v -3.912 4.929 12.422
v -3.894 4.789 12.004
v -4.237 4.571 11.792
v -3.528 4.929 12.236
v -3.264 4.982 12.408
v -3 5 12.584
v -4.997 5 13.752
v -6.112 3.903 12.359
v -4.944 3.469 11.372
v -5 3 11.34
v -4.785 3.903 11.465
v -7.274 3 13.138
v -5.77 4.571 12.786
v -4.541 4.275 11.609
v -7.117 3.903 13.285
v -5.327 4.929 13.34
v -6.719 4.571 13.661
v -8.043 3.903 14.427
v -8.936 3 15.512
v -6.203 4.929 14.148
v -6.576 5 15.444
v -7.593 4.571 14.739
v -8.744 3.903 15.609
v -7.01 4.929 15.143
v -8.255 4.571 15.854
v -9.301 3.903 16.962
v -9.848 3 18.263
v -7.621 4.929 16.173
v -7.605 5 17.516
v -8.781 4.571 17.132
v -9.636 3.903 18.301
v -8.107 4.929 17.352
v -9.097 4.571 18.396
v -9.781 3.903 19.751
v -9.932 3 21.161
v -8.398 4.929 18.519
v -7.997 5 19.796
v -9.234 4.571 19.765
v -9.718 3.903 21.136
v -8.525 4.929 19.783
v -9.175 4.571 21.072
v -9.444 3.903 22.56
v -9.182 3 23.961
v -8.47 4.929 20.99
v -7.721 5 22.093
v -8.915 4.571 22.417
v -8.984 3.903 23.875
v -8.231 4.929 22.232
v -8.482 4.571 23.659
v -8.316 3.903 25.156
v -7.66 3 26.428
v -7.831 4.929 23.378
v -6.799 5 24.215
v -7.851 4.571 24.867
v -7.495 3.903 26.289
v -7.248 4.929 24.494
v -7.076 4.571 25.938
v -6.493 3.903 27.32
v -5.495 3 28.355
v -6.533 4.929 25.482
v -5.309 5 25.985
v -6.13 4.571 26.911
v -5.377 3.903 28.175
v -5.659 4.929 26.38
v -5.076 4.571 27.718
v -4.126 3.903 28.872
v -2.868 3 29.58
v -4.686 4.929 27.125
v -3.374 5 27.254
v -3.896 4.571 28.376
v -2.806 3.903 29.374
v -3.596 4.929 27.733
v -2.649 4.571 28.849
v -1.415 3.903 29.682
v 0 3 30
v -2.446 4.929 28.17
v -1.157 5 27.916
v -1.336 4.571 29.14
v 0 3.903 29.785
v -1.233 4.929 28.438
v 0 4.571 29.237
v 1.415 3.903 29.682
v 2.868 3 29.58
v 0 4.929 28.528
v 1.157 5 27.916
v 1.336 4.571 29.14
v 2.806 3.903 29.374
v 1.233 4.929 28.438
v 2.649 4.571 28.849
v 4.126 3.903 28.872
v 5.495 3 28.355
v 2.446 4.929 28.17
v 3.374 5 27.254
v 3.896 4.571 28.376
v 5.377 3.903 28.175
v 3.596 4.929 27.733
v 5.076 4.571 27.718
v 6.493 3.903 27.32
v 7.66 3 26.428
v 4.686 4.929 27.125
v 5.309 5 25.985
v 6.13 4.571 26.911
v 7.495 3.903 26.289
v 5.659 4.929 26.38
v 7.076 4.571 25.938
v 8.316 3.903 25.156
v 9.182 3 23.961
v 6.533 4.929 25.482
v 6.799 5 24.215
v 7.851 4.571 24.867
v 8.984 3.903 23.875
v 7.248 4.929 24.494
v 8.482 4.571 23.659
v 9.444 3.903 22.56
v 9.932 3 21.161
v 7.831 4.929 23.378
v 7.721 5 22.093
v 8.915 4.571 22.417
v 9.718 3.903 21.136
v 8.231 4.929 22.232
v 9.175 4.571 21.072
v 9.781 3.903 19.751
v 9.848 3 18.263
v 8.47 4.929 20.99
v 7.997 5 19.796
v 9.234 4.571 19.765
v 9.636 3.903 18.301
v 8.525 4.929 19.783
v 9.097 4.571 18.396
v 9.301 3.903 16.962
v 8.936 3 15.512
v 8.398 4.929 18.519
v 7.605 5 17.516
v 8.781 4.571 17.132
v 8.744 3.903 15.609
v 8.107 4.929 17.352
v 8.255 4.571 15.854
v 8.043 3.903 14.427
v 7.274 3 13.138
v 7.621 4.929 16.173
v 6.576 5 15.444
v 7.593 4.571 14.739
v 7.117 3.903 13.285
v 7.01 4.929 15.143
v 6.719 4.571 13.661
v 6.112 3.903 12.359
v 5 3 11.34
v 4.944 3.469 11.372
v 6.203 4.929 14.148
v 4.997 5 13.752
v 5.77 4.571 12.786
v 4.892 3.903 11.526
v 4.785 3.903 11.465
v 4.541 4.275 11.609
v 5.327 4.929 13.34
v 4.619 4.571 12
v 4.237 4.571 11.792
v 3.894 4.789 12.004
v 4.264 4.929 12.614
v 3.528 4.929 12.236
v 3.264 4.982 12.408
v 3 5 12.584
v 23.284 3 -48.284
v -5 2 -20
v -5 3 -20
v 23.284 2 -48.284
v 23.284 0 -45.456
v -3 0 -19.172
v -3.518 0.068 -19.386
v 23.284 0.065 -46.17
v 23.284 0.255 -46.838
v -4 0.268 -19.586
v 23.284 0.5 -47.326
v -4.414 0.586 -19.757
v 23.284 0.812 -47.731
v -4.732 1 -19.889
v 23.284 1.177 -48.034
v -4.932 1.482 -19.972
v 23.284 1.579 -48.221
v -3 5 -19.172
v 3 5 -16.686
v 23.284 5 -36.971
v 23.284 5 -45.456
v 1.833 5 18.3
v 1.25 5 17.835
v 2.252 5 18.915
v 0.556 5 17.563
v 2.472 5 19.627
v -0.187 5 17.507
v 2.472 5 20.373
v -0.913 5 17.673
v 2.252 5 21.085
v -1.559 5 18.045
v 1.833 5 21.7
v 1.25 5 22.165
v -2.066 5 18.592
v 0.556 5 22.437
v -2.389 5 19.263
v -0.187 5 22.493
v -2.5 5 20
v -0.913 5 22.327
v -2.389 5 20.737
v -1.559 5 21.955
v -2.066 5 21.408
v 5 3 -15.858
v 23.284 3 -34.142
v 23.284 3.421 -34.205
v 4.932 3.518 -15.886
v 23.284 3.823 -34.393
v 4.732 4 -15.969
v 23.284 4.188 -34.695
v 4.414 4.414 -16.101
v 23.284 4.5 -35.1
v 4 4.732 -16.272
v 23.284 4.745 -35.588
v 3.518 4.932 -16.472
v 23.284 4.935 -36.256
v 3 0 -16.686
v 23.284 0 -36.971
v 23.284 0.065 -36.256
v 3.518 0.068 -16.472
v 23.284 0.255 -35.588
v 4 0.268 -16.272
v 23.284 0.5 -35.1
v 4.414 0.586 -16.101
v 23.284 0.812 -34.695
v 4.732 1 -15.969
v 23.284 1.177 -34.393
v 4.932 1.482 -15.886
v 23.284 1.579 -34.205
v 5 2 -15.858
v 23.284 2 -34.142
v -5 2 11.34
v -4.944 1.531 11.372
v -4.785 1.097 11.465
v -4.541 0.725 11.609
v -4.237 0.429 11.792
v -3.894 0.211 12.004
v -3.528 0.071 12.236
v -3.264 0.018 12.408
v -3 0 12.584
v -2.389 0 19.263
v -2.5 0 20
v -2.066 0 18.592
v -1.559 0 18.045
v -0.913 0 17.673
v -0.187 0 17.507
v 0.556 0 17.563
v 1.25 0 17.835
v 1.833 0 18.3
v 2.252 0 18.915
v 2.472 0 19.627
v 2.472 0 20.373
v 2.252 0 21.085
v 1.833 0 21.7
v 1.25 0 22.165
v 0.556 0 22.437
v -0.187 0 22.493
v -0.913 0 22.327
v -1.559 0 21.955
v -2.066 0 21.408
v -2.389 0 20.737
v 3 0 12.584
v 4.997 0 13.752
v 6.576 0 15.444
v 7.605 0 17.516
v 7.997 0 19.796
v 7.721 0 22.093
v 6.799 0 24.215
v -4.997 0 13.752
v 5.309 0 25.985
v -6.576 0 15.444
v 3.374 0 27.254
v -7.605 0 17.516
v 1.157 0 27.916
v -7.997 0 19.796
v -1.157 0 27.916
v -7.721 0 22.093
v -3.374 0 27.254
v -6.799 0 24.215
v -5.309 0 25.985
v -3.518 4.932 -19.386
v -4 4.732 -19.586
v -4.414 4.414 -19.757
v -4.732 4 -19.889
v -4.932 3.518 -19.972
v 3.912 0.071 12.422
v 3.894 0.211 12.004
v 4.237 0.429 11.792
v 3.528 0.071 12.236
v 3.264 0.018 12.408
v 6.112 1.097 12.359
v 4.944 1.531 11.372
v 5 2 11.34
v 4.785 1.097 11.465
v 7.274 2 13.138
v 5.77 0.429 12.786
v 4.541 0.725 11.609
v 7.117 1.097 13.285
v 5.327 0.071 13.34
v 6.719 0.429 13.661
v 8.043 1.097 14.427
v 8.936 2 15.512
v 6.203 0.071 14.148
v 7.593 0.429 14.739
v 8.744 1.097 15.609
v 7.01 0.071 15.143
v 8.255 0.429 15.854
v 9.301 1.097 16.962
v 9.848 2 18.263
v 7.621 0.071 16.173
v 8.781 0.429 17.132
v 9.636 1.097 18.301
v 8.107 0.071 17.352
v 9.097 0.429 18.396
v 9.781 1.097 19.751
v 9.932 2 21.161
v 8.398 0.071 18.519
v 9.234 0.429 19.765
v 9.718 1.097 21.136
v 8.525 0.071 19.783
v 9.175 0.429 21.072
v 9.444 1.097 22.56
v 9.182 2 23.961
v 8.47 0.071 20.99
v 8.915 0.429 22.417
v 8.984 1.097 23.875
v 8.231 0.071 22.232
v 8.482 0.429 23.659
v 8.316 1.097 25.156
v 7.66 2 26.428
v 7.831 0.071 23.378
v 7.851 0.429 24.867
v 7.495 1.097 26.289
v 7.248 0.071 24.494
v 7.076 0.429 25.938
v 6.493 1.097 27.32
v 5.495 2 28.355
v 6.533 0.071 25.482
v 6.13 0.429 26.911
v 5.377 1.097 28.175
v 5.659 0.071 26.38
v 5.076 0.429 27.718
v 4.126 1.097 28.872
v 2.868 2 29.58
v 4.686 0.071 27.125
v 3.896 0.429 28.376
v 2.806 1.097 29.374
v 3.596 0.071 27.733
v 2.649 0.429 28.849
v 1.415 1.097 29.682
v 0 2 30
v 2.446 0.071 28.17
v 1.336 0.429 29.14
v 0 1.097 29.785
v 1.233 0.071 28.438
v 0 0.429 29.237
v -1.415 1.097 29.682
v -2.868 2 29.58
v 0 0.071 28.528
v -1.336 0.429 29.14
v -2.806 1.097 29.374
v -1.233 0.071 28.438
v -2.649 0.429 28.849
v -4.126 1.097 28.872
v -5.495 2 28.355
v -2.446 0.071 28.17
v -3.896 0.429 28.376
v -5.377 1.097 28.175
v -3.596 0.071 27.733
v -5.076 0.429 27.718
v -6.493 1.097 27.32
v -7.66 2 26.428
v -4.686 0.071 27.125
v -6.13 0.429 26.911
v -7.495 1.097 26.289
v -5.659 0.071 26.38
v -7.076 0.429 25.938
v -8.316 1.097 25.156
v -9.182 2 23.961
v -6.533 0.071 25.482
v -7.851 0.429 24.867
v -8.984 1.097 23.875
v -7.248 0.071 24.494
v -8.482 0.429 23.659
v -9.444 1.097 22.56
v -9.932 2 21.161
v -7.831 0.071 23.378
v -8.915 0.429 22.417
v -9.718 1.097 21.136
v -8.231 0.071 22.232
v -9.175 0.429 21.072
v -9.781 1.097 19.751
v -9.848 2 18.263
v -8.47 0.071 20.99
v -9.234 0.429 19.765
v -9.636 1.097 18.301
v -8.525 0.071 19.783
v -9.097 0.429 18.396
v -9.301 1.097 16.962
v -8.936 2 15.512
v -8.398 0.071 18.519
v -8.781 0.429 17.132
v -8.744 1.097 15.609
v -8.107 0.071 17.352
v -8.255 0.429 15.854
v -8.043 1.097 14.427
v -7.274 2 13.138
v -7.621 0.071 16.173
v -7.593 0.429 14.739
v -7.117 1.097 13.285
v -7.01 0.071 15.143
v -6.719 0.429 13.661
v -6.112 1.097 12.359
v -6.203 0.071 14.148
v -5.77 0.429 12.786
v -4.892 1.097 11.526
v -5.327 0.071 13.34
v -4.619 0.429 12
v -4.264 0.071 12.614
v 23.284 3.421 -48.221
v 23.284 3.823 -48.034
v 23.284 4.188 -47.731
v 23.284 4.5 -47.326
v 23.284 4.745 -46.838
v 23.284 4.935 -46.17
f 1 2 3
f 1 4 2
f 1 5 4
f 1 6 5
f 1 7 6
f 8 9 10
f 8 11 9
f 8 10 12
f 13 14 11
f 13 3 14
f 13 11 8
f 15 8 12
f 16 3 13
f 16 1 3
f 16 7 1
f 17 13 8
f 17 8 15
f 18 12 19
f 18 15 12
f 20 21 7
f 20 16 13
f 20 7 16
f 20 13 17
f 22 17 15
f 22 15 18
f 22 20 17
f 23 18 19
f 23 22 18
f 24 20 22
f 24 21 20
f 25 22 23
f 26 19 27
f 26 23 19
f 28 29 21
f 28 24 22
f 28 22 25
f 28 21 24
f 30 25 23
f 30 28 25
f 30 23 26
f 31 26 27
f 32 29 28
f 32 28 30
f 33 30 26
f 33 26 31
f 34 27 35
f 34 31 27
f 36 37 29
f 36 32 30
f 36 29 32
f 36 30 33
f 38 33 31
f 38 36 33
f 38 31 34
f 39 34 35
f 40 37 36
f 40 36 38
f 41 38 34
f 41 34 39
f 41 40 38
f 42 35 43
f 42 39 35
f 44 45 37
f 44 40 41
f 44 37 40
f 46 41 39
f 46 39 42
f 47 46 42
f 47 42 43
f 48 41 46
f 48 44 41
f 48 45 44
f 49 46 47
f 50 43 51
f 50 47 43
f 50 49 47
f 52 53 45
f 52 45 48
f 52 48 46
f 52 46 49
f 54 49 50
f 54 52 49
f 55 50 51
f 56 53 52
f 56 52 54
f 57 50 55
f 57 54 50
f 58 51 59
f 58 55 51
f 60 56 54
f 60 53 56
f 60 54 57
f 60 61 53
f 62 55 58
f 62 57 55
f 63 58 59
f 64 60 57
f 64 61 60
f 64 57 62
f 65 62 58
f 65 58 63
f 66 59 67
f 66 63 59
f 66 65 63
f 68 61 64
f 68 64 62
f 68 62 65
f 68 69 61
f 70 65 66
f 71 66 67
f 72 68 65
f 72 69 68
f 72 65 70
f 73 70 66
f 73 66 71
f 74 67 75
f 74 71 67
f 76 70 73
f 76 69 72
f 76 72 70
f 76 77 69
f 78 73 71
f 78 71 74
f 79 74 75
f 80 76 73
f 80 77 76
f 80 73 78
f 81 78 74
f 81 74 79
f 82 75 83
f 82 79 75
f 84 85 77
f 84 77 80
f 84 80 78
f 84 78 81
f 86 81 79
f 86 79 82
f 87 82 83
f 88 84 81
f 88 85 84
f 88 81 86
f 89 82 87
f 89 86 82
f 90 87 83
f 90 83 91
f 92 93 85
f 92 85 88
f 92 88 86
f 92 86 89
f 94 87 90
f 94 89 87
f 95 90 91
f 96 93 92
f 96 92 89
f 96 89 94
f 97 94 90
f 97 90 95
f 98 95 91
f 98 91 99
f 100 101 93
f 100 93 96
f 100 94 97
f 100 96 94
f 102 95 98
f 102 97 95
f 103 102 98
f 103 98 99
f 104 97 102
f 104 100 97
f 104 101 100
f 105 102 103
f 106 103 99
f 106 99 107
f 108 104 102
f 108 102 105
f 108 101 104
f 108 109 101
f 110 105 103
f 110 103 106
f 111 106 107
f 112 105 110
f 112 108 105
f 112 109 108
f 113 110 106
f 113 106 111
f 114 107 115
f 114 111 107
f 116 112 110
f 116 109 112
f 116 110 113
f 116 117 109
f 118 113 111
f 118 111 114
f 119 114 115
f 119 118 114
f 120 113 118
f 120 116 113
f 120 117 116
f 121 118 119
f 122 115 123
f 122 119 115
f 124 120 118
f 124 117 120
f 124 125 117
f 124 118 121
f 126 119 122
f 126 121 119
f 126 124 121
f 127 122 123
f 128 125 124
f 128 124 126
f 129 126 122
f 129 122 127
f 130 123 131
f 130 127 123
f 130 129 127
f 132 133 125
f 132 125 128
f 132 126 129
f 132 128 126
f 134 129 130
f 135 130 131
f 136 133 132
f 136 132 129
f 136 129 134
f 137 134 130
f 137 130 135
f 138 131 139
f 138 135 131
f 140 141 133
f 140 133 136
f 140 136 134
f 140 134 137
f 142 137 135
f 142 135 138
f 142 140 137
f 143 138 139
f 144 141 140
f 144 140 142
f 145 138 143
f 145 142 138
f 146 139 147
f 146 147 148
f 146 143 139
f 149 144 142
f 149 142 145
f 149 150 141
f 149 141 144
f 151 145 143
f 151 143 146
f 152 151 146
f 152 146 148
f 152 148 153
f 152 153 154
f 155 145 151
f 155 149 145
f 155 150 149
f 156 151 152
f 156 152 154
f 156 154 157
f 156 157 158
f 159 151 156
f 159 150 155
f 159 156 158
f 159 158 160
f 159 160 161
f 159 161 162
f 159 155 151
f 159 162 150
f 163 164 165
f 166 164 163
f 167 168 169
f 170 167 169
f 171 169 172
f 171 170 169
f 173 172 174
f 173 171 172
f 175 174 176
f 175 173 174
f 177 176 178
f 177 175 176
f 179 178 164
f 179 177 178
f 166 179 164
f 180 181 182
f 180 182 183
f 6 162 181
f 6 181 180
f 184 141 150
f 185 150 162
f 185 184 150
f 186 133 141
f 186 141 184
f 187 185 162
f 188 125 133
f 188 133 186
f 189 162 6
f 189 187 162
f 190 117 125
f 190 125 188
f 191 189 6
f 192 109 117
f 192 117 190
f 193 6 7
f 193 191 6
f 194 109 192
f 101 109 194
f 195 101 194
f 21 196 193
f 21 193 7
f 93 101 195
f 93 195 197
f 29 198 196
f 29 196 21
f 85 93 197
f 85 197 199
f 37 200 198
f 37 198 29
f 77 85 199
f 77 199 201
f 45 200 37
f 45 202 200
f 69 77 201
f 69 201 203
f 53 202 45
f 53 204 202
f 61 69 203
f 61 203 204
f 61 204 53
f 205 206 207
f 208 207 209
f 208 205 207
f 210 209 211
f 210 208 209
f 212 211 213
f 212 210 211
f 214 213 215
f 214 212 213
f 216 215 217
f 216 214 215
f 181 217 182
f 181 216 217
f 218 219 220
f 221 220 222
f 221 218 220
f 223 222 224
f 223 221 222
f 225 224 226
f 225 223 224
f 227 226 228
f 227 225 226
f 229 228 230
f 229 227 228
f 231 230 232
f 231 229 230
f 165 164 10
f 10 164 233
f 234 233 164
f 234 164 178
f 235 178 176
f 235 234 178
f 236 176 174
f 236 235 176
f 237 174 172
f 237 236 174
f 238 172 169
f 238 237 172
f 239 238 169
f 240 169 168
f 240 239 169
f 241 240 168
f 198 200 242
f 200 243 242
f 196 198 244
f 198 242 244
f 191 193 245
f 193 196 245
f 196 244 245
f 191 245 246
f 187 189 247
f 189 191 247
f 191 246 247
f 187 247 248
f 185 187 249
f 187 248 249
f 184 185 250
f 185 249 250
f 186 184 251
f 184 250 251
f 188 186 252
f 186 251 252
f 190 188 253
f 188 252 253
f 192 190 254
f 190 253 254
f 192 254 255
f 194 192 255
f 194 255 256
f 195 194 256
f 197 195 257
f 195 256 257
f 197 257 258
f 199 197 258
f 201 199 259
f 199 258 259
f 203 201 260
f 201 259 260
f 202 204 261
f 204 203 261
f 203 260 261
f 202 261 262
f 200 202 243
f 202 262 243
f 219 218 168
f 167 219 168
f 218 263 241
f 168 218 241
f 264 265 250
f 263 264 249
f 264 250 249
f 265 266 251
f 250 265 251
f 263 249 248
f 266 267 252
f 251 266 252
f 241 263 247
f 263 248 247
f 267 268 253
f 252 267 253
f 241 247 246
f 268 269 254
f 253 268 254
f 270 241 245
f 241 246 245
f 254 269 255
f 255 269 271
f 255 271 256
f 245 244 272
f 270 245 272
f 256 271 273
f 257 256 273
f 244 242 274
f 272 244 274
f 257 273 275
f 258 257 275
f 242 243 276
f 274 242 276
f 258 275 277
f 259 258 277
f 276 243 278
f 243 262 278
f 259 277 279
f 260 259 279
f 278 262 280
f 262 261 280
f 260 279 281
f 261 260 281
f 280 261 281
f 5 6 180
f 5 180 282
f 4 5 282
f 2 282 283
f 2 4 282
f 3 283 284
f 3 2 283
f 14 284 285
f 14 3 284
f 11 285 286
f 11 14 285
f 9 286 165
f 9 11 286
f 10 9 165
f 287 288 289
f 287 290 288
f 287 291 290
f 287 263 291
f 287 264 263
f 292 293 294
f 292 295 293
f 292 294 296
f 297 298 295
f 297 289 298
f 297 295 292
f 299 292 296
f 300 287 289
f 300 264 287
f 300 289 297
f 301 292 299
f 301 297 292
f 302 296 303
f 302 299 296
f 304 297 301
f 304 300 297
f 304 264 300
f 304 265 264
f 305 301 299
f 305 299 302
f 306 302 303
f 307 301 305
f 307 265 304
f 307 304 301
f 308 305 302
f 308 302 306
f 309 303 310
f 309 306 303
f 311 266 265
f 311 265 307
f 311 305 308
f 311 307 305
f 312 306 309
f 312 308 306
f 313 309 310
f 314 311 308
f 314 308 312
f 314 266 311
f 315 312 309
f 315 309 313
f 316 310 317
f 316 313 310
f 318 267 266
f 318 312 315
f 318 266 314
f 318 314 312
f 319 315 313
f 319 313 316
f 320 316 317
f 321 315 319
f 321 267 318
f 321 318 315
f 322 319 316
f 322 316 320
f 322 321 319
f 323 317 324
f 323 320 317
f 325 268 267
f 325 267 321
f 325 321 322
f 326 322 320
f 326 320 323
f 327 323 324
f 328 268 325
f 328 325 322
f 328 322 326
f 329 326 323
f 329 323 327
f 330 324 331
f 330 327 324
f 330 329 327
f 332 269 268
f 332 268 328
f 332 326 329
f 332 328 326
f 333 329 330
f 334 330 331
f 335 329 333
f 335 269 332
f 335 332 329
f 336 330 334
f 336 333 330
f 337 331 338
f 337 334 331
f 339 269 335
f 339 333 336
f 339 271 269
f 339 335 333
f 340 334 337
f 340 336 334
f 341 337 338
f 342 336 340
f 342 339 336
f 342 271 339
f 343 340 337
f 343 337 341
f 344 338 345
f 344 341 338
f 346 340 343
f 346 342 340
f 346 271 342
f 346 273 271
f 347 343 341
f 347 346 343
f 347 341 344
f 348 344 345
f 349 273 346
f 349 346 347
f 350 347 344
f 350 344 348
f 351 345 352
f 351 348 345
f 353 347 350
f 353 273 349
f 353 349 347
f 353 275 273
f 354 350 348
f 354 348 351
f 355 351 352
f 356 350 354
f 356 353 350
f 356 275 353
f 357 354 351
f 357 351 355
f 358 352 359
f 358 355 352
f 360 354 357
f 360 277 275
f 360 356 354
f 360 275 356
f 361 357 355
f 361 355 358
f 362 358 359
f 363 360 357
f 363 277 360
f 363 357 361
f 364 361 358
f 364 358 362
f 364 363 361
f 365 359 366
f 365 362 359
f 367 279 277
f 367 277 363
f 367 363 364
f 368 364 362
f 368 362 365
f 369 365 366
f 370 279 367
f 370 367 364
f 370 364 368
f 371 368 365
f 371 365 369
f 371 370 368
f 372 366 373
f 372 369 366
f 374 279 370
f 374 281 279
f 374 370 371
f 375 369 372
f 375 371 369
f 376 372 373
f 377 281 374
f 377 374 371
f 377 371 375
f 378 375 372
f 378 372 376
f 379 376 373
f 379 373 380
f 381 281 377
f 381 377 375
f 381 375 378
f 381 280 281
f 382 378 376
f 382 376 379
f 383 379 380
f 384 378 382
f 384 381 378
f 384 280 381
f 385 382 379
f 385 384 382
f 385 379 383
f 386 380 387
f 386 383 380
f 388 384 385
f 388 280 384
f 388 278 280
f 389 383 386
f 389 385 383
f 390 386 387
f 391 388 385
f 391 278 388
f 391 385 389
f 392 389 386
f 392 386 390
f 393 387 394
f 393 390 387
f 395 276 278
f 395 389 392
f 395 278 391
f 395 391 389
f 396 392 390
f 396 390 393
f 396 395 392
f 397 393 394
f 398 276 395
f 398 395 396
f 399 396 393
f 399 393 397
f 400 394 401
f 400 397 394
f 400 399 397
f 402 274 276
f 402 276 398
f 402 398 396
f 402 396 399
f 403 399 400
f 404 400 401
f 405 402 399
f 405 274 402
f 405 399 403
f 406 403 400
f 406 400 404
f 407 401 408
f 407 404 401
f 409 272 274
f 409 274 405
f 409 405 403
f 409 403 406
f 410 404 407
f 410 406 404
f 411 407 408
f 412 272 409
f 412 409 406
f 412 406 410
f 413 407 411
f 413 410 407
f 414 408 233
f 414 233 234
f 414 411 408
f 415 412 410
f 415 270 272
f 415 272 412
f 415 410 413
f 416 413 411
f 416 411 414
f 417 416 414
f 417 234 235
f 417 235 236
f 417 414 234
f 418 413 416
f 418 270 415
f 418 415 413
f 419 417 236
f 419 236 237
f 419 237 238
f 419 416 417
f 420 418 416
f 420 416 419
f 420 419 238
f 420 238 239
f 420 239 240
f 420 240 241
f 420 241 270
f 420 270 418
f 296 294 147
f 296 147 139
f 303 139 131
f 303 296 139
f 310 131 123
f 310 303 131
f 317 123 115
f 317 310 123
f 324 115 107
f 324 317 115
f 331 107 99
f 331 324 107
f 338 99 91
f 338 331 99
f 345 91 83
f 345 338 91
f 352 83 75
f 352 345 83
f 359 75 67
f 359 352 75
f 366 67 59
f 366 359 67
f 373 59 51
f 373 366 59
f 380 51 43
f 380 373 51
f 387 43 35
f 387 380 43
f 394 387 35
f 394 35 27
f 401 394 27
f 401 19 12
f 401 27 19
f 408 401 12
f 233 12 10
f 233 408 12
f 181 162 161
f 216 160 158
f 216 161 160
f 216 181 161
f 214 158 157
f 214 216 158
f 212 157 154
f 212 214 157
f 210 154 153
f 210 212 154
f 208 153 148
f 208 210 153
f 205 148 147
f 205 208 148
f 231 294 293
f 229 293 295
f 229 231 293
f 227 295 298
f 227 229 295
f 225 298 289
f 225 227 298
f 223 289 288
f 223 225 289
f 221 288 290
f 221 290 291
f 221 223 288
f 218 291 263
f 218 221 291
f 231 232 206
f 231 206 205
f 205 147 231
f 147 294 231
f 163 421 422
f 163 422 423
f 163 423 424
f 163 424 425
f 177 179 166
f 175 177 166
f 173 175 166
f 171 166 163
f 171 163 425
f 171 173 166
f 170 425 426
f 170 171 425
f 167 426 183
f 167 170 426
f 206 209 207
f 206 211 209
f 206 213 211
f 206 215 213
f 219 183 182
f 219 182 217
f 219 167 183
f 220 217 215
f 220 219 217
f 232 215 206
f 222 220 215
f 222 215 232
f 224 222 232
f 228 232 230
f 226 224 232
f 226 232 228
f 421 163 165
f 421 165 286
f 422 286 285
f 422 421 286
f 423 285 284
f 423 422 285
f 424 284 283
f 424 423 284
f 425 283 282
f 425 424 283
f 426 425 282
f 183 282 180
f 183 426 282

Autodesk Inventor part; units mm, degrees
ref_plane "YZ Plane" through (0, 0, 0) normal (1, 0, 0) x (0, 1, 0)
ref_plane "XZ Plane" through (0, 0, 0) normal (0, 1, 0) x (-1, 0, 0)
ref_plane "XY Plane" through (0, 0, 0) normal (0, 0, 1) x (1, 0, 0)
sketch "Sketch1" plane through (0, 0, 0) normal (0, 1, 0) x (-1, 0, 0)
  line L0 (5, -20) -> (5, 11.3397)
  line L1 (-5, 11.3397) -> (-5, -15.8579)
  arc A0 (5, 11.3397) -> (-5, 11.3397) centre (0, 20) ccw
  line L2 (5, -20) -> (-23.2843, -48.2843)
  line L3 (-23.2843, -34.1421) -> (-5, -15.8579)
  line L4 (5, -20) -> (45, -20) construction
  line L5 (-23.2843, -48.2843) -> (-23.2843, -34.1421)
  circle A1 centre (0, 20) radius 2.5
  point P0 (0, 0)
  dimension "d2" = 20
  dimension "d8" = 135
  dimension "d14" = 23.2843
extrude "Extrusion1" add sketch "Sketch1" along normal blind 5
fillet "Fillet1" radius 2 10 edges at (0, 5, 30) (0, 0, 30) (5, 5, -2.2591) (-5, 5, -4.3301) (5, 0, -2.2591) (-5, 0, -4.3301) (9.1421, 0, -34.1421) (9.1421, 5, -34.1421) (14.1421, 0, -25) (14.1421, 5, -25)
properties part number "Gripper"
